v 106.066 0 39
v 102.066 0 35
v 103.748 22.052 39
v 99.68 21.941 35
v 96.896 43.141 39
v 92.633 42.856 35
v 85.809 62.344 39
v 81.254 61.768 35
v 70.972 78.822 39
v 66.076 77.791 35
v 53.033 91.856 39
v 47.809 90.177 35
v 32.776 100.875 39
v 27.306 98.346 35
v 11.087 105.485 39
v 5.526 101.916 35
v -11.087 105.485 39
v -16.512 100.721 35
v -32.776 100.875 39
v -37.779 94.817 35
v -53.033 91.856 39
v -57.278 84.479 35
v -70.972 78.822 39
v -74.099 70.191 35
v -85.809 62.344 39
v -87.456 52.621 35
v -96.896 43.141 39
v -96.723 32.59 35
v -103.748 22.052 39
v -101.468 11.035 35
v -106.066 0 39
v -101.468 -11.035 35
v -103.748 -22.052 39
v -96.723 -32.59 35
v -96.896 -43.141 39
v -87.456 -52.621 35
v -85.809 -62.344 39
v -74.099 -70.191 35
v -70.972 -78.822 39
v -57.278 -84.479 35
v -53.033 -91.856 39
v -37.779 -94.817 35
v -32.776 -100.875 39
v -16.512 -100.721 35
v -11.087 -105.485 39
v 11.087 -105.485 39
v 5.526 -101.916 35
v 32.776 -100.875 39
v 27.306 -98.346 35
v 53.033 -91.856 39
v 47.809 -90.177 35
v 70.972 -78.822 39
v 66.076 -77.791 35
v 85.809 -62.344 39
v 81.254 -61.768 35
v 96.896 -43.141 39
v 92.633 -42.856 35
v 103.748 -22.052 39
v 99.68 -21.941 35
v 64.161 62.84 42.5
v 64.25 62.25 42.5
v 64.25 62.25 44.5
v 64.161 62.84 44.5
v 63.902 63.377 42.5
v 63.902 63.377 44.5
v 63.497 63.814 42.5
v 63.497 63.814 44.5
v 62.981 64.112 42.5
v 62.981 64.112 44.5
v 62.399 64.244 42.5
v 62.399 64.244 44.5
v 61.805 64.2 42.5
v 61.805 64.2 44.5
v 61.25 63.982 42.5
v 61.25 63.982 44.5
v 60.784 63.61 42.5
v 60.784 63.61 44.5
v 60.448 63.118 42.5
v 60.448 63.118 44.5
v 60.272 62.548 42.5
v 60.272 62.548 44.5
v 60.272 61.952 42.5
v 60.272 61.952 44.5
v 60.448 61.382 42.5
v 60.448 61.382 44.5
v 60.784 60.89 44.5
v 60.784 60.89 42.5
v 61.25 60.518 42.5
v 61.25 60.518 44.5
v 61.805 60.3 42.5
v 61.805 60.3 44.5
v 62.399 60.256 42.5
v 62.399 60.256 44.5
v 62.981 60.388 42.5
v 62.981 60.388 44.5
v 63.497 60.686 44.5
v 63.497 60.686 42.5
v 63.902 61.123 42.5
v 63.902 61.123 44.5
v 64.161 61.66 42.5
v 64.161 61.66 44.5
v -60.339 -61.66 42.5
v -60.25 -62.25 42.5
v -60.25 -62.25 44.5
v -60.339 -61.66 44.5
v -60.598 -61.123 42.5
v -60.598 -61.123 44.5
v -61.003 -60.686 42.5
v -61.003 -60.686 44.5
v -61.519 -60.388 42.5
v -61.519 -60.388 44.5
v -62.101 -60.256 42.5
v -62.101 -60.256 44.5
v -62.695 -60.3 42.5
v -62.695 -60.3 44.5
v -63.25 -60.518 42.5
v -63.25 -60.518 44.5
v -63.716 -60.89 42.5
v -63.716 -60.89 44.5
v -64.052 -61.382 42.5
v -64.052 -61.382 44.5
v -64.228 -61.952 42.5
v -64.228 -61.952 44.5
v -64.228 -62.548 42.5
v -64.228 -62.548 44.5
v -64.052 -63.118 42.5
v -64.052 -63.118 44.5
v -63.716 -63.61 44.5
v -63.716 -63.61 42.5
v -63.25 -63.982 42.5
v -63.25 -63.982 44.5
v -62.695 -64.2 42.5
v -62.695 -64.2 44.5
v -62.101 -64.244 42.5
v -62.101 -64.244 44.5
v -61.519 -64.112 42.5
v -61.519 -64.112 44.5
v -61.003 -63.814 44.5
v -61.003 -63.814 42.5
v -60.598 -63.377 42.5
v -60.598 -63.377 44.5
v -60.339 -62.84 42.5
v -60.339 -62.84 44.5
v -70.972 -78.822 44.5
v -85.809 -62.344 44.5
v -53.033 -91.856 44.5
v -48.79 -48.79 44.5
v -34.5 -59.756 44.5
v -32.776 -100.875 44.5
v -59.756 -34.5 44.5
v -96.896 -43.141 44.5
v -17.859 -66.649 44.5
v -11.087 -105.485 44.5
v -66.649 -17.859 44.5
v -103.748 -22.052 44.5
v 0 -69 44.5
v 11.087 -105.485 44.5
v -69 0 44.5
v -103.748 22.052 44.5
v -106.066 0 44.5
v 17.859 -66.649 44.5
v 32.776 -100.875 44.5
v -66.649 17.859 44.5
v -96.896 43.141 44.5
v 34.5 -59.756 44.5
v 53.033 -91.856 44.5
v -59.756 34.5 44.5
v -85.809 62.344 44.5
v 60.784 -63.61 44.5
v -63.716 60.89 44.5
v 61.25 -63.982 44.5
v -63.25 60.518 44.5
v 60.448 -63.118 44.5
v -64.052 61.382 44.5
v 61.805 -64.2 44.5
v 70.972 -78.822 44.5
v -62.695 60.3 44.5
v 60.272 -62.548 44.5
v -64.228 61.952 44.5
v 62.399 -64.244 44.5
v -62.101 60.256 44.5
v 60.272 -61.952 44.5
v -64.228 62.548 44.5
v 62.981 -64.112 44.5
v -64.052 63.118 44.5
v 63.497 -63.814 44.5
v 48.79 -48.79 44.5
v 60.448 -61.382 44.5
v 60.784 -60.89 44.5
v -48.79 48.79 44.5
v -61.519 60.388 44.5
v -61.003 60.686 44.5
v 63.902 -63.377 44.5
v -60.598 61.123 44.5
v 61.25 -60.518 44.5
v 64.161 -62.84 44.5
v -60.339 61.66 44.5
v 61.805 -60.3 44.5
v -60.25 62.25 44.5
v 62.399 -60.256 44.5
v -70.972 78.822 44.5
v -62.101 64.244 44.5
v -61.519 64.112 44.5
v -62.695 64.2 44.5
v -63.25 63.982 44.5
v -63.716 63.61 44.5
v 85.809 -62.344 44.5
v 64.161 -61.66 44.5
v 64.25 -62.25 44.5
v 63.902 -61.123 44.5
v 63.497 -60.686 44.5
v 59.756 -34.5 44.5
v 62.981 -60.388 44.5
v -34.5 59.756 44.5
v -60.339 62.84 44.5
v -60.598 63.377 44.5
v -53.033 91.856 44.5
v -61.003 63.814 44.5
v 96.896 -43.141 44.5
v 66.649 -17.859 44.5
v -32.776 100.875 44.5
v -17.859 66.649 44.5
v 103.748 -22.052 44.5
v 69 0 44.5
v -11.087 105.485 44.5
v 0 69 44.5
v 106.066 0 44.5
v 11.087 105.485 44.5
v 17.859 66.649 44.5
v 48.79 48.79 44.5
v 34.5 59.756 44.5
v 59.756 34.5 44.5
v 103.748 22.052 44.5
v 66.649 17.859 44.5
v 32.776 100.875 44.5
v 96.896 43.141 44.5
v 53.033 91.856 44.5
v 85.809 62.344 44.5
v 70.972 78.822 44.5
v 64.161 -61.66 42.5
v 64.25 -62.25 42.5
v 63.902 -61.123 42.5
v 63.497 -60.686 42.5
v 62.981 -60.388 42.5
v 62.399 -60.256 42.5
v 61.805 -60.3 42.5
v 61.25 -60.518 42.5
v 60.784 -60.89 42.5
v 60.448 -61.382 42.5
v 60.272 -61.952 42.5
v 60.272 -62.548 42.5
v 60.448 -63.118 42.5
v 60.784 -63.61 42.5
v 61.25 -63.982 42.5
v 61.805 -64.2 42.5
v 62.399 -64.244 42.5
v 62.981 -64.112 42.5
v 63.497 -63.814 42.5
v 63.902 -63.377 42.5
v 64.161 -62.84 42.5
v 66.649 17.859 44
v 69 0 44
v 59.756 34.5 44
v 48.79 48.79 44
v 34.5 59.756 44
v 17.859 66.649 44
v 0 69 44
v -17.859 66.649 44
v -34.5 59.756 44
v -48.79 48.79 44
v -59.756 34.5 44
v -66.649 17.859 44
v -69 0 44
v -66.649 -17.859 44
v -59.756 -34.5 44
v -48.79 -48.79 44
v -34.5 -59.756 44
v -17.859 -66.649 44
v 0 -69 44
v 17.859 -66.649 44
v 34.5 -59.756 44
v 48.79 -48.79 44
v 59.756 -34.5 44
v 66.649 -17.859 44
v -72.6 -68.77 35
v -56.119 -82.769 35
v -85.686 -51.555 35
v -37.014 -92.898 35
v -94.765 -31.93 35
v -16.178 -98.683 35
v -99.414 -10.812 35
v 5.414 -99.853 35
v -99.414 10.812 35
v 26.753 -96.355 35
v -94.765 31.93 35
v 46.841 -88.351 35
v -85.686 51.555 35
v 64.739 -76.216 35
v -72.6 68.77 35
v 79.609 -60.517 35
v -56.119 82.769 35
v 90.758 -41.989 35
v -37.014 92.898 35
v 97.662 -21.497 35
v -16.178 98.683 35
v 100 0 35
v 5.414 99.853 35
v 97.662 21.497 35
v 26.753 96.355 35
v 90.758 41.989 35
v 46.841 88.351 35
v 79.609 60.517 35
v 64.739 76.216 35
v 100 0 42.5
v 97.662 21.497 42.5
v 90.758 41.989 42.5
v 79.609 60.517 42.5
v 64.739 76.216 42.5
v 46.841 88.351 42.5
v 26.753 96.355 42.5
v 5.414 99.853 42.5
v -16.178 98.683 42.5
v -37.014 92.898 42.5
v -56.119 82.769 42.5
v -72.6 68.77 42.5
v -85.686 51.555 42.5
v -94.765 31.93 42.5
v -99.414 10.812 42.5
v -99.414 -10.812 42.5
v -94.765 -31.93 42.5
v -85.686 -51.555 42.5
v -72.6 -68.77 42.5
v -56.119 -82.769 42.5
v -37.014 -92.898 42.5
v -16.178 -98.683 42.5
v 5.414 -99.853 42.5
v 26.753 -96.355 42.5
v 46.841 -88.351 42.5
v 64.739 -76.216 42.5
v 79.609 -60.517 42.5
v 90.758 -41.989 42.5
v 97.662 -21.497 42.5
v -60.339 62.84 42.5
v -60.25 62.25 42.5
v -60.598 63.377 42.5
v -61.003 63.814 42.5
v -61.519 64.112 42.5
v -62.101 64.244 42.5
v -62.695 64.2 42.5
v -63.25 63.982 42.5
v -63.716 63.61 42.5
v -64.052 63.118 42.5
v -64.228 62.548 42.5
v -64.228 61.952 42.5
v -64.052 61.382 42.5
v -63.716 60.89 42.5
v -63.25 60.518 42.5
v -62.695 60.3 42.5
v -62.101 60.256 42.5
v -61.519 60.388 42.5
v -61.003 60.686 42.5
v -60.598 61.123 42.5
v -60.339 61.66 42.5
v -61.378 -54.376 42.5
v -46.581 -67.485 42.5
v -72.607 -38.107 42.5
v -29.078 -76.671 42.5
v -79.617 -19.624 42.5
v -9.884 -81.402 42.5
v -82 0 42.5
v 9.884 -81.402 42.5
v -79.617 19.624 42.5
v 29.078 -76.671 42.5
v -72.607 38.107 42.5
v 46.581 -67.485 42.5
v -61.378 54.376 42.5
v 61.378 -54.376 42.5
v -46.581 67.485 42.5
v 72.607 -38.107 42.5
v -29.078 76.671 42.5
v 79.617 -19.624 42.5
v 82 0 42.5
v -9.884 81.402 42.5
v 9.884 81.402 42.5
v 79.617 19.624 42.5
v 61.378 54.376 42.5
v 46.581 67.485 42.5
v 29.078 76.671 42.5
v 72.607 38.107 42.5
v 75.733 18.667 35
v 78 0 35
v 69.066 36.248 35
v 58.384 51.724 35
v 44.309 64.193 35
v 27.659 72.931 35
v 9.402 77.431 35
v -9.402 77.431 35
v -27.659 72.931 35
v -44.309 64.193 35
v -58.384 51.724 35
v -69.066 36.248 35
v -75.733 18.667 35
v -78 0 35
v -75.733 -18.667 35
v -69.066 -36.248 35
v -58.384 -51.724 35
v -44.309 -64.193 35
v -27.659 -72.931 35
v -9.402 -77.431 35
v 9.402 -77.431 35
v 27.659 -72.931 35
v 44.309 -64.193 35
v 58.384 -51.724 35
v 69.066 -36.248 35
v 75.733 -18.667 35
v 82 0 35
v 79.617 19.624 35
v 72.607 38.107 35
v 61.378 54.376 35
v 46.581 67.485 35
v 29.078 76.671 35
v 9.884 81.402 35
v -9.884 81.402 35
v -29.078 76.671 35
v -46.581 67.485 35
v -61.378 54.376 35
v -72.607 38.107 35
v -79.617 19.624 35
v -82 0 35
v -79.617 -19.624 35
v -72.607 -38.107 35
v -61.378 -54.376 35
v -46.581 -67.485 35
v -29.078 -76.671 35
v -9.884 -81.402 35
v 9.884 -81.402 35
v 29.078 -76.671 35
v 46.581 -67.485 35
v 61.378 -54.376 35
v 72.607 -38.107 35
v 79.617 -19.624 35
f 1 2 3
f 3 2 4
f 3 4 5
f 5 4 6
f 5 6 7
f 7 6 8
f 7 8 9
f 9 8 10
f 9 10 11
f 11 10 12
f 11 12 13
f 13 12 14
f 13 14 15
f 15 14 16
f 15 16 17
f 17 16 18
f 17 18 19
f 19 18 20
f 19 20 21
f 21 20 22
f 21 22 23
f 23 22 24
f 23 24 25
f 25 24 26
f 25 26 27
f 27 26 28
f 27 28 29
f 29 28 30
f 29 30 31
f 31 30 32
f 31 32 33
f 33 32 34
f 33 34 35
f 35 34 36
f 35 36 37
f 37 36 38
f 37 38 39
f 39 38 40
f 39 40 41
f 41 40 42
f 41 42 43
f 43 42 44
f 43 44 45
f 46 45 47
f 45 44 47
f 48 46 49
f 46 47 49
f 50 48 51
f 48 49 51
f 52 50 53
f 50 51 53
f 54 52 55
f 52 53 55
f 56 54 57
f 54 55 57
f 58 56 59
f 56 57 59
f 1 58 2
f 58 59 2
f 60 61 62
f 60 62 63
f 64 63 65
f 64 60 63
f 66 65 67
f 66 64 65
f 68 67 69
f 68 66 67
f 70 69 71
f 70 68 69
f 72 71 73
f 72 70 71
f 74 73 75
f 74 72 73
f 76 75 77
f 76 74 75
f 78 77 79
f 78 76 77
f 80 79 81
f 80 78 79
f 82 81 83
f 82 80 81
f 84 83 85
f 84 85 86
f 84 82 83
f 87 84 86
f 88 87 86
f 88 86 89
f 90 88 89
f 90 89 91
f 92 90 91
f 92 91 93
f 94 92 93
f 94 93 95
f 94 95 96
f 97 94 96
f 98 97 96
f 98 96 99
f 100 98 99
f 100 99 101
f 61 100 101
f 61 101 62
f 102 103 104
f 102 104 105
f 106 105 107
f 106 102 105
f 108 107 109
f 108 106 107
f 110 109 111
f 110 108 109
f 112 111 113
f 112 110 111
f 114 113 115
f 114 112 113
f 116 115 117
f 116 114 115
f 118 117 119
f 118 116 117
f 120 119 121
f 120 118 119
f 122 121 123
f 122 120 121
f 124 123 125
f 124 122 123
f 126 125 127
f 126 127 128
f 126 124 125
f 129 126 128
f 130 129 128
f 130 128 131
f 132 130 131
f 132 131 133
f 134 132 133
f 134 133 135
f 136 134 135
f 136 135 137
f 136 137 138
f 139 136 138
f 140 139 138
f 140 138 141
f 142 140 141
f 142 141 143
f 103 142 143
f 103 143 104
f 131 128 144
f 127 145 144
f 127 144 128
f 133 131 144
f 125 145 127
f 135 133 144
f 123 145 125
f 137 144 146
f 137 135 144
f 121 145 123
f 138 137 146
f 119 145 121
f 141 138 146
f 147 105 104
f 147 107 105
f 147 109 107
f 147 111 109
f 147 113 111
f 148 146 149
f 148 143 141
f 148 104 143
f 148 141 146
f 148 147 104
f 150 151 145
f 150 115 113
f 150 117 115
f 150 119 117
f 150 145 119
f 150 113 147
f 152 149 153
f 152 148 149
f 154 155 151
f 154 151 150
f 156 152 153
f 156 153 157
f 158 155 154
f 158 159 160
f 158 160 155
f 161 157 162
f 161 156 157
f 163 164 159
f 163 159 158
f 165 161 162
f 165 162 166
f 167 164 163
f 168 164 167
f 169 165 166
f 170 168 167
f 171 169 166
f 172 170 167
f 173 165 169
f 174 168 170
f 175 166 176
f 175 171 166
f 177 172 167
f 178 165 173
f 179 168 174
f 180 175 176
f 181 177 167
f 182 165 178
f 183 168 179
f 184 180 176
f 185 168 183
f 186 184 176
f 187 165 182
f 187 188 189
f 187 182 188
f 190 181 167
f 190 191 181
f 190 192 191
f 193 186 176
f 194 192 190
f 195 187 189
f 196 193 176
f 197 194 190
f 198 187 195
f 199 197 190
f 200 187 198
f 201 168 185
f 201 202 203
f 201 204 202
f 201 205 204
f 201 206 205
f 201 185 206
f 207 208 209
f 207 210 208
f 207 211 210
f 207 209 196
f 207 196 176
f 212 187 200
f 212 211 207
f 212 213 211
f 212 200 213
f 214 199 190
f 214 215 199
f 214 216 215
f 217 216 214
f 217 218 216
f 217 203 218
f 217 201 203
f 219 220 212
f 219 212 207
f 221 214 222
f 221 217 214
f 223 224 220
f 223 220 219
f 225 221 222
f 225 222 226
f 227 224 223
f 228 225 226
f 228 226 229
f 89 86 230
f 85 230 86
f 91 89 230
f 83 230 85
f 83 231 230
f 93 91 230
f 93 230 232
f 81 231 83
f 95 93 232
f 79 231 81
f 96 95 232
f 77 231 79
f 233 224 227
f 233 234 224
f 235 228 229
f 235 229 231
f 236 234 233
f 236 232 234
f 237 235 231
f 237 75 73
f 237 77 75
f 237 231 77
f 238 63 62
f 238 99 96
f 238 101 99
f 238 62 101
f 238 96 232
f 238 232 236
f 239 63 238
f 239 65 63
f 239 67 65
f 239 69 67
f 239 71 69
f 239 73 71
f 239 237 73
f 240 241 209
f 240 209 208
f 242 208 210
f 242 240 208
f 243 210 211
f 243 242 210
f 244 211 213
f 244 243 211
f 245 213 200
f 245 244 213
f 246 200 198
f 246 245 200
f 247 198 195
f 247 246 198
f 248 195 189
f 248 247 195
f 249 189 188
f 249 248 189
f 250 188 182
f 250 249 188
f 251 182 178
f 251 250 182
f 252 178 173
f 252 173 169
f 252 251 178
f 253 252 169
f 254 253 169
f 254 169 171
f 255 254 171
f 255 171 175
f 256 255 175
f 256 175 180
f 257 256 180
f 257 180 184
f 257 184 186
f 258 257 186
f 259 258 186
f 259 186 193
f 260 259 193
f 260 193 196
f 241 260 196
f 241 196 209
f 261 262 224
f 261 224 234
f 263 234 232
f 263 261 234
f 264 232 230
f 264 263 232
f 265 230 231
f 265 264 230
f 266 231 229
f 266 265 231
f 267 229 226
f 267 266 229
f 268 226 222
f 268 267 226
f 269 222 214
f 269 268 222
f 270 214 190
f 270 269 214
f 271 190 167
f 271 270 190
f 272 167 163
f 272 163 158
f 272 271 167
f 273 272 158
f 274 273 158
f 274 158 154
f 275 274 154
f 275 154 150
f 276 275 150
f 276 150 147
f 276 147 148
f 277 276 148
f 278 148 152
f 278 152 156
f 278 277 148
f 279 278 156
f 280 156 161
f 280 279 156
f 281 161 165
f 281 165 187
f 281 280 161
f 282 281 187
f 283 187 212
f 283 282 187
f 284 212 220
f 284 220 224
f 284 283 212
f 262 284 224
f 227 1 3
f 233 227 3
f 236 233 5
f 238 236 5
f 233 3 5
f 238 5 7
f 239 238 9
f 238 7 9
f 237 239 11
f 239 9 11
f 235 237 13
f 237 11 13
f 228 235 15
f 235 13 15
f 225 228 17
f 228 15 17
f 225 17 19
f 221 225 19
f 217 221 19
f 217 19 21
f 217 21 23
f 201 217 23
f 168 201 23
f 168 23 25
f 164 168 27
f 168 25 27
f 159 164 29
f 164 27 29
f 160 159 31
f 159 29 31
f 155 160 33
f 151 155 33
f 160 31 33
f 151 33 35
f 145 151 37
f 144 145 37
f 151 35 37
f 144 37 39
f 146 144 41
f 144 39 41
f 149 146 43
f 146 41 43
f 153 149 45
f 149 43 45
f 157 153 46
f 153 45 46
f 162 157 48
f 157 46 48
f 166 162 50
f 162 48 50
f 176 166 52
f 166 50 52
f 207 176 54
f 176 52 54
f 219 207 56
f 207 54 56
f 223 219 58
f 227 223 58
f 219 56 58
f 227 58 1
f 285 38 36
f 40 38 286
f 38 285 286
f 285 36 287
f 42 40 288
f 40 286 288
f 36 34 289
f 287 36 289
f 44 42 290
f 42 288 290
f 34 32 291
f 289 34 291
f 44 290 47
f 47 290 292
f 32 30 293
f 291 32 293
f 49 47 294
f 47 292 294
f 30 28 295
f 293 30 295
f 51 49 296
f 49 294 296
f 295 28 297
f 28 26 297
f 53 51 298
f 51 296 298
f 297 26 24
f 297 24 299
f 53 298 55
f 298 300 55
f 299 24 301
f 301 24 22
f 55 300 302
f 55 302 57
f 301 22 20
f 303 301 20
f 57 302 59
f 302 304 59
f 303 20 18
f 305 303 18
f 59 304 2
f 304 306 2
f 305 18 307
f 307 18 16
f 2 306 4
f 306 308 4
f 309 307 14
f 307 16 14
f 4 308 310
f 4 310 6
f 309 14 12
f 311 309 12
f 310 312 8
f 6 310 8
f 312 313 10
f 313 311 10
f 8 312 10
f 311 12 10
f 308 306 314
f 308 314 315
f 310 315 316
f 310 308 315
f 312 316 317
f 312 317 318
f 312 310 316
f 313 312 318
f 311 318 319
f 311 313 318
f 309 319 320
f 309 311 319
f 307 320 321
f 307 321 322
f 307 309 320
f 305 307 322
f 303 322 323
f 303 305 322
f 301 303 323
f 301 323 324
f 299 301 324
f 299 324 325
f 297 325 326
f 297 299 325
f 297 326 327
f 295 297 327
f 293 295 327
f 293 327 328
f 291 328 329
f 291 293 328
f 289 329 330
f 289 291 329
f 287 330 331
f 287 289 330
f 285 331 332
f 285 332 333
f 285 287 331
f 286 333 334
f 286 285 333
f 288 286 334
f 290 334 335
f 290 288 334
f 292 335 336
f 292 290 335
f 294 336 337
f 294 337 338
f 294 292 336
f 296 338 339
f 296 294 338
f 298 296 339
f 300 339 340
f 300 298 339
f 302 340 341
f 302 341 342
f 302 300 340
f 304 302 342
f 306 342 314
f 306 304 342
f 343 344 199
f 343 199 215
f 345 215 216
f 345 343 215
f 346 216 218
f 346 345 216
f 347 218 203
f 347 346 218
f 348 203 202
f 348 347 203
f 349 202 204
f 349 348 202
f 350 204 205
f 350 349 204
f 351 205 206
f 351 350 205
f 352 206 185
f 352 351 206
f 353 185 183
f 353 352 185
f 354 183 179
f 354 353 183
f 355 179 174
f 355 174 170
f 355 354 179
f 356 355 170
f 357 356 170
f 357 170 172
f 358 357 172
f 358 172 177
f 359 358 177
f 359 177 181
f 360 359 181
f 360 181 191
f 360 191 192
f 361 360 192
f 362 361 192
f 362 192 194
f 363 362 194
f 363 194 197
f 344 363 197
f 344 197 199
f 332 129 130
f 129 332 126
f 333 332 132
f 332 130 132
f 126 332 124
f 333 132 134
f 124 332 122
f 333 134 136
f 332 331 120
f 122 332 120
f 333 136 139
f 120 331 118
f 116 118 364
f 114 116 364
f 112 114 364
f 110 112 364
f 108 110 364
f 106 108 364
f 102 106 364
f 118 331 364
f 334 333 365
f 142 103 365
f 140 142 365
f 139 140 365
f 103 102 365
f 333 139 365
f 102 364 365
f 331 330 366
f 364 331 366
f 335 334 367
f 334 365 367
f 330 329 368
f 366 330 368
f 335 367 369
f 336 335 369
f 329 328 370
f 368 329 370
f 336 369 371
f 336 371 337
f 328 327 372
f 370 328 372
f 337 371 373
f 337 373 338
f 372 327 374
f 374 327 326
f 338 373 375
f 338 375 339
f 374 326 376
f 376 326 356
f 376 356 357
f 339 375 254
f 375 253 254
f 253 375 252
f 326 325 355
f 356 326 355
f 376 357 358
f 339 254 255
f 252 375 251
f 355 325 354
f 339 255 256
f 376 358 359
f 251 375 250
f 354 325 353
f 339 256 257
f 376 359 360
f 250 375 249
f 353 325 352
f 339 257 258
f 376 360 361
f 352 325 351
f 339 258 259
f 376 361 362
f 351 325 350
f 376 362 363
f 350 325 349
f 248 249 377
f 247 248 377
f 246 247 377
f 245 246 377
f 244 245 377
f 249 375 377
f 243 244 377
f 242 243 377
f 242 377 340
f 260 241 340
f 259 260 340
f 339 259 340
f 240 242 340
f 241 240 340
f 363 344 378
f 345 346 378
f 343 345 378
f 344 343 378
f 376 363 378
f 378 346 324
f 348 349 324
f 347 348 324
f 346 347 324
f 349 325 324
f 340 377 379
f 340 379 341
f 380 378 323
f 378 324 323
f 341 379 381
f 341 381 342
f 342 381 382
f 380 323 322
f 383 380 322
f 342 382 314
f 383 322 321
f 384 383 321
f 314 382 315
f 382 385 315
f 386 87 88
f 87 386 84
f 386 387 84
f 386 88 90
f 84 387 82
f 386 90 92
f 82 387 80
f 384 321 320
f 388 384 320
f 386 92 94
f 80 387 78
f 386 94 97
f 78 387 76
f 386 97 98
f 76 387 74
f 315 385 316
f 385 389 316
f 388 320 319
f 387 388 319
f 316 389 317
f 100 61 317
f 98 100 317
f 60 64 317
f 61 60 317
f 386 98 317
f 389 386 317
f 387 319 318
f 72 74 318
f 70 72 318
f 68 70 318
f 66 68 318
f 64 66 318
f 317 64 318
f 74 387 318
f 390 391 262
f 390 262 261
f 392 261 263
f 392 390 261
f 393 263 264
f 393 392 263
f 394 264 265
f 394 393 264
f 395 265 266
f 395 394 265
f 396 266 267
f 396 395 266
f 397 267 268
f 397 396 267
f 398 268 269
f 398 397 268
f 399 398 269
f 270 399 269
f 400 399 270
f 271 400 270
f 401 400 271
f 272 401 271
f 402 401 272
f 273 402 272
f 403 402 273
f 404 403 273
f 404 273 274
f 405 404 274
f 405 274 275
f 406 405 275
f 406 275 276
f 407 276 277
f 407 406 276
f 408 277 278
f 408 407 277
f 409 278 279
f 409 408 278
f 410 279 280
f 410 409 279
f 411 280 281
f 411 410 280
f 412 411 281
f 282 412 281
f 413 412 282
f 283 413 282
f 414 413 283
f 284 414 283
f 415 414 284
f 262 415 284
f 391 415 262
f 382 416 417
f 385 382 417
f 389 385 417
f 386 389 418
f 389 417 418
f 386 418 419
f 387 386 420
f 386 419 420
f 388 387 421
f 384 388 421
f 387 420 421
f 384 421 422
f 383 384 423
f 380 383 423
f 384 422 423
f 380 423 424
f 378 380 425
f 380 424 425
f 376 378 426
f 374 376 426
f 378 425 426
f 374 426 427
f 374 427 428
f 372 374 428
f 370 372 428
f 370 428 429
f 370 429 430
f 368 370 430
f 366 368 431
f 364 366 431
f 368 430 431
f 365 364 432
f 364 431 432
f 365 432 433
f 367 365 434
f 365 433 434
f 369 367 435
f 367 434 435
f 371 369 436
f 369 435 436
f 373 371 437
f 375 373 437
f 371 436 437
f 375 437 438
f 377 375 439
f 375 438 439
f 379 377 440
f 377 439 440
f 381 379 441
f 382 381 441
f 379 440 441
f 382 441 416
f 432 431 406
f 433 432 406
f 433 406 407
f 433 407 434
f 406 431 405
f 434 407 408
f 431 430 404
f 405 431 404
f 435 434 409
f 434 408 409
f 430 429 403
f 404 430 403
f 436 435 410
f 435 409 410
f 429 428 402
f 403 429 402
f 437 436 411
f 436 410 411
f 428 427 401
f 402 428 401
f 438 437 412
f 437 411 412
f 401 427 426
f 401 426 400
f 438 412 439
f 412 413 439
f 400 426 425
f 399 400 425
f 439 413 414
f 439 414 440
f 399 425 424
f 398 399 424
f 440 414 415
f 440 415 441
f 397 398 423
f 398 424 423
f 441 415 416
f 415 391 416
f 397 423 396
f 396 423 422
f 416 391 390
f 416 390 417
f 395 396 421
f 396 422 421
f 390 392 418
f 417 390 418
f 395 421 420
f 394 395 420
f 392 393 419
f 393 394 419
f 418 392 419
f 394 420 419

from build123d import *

# Parameters (mm, degrees)
SKETCH025_R     = 106.066017
SKETCH025_R_2   = 2
SKETCH025_R_3   = 69
PAD011_DEPTH    = 9.5
SKETCH026_R     = 100
SKETCH026_R_2   = 82
POCKET004_DEPTH = 7.5
CHAMFER012_SIZE = 9
CHAMFER013_SIZE = 4


with BuildPart() as part:
    # Sketch025 → Pad011 (new body)
    with BuildSketch(Plane.XY):
        Circle(SKETCH025_R)
        with Locations((-62.25, 62.25)):
            Circle(SKETCH025_R_2, mode=Mode.SUBTRACT)
        with Locations((62.25, 62.25)):
            Circle(SKETCH025_R_2, mode=Mode.SUBTRACT)
        with Locations((62.25, -62.25)):
            Circle(SKETCH025_R_2, mode=Mode.SUBTRACT)
        with Locations((-62.25, -62.25)):
            Circle(SKETCH025_R_2, mode=Mode.SUBTRACT)
        Circle(SKETCH025_R_3, mode=Mode.SUBTRACT)
    extrude(amount=PAD011_DEPTH)

    # Sketch026 → Pocket004 (cut)
    with BuildSketch(Plane.XY):
        Circle(SKETCH026_R)
        Circle(SKETCH026_R_2, mode=Mode.SUBTRACT)
    extrude(amount=POCKET004_DEPTH, mode=Mode.SUBTRACT)

    # Chamfer012
    chamfer012_edges = [part.edges().sort_by_distance(p)[0] for p in [
        (-69, 0, 0),
    ]]
    chamfer(chamfer012_edges, length=CHAMFER012_SIZE)

    # Chamfer013
    chamfer013_edges = [part.edges().sort_by_distance(p)[0] for p in [
        (-106.066017, 0, 0),
    ]]
    chamfer(chamfer013_edges, length=CHAMFER013_SIZE)


with BuildPart() as part_1:
    # Body009 placement: moved
    add(part.part.moved(Location((0, 0, 35))))


solid = part_1.part
